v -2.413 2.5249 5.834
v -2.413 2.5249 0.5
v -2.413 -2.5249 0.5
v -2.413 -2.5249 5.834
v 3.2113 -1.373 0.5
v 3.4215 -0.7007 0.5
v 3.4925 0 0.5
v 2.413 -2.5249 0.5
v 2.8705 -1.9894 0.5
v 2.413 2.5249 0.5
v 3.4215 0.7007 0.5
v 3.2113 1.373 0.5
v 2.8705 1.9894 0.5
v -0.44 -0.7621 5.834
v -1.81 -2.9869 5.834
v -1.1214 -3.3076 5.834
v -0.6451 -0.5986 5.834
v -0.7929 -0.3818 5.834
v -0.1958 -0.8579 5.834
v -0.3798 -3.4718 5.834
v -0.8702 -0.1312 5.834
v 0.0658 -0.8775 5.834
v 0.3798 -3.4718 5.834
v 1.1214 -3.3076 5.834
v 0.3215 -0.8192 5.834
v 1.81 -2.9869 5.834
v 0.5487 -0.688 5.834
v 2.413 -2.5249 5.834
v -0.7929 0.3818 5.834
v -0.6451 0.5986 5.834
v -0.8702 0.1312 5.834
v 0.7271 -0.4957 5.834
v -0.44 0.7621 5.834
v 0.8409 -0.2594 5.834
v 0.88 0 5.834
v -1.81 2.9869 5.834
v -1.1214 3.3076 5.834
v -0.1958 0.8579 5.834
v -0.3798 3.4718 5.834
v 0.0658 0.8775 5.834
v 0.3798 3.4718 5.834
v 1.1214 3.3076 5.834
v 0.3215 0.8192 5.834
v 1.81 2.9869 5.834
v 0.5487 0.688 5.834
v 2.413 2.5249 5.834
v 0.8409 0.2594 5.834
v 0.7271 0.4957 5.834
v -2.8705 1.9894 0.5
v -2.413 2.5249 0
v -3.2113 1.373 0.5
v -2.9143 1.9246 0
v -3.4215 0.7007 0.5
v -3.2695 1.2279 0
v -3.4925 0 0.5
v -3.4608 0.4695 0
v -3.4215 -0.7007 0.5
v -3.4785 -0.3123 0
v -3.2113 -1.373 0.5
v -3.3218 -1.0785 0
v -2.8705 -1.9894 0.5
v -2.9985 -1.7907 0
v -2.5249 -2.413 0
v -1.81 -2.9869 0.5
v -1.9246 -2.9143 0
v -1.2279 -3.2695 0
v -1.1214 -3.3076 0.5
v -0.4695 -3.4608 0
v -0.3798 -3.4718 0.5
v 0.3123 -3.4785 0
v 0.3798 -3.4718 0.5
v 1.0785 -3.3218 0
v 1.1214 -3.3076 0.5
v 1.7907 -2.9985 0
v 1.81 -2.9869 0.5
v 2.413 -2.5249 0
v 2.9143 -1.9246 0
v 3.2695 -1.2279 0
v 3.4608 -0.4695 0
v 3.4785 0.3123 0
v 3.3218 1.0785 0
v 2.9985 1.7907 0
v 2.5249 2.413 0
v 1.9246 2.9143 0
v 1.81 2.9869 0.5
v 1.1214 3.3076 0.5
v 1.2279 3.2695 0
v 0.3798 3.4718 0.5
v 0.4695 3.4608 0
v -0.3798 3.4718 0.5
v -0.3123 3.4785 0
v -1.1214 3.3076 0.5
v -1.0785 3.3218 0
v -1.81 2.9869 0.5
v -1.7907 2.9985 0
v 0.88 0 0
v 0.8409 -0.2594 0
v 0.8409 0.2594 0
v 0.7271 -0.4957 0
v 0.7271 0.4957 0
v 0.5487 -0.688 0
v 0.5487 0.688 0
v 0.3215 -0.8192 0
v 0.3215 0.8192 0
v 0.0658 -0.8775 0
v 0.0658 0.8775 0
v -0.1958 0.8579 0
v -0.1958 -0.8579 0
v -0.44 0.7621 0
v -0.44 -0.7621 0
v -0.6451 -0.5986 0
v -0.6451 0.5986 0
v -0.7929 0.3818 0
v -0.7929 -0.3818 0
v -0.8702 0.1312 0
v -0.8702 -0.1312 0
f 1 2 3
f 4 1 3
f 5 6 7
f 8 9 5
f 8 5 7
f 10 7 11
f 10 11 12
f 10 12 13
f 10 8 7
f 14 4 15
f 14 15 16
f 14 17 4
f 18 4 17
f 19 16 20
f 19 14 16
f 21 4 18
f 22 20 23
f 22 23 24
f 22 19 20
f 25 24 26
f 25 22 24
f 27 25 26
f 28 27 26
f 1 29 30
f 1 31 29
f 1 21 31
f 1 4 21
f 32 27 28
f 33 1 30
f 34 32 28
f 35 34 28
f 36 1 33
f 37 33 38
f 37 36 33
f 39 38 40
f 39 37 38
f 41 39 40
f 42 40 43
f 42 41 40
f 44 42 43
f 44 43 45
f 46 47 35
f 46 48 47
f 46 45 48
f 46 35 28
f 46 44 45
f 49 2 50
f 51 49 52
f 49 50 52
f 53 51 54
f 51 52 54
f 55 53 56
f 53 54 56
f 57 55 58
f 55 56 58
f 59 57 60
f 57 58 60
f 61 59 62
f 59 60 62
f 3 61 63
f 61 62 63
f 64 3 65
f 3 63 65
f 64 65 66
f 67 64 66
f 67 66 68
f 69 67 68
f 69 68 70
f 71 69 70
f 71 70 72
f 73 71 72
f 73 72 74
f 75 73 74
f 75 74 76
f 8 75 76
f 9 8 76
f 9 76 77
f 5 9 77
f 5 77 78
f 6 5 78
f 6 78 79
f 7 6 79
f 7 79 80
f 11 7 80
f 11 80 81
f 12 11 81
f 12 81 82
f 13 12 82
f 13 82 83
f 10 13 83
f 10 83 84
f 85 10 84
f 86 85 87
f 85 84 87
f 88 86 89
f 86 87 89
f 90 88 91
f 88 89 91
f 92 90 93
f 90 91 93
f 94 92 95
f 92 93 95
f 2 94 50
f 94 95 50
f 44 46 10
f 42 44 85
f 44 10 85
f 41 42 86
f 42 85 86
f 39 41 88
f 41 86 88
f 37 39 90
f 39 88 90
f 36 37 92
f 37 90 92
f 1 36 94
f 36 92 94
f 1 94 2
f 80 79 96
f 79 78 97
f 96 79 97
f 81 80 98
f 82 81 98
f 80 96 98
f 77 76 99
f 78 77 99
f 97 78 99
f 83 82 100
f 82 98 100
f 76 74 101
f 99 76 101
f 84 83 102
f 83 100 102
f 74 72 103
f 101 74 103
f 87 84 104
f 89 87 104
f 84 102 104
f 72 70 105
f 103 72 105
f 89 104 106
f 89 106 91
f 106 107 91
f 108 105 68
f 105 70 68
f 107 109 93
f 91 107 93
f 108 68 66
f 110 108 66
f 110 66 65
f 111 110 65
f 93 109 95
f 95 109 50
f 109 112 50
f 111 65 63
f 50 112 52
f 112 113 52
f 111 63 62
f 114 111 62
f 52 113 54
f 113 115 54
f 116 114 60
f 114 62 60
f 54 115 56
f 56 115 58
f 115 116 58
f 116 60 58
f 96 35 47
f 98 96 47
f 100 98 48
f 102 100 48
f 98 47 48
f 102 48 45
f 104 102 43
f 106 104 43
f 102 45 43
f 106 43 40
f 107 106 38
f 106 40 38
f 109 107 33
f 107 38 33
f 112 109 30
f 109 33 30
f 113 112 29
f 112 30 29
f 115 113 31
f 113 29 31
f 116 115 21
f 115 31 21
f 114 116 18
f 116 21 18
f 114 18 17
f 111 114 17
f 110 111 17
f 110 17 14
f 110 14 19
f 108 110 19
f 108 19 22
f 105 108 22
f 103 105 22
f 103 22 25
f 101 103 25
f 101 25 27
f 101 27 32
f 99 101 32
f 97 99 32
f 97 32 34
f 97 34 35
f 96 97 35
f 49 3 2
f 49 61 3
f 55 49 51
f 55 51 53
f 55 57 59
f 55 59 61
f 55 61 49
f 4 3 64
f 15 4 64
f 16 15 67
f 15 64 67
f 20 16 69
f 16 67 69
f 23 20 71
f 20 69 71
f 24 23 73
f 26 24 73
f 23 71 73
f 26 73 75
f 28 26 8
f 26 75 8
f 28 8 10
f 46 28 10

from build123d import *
from build123d.topology import SkipClean

# Parameters (mm, degrees)
SKETCH1_R          = 3.4925
EXTRUDE1_DEPTH     = 0.5
EXTRUDE2_DEPTH     = 5.334
CUT_EXTRUDE1_REACH = 9.644
SKETCH3_R          = 0.88


with BuildPart() as part:
    # Sketch1 → Extrude1 (new body)
    with BuildSketch(Plane.XY):
        with Locations(Location((0, 0, 0), (0, 0, 133.702114437))):
            Circle(SKETCH1_R)
    extrude(amount=EXTRUDE1_DEPTH)

    # Sketch2 → Extrude2 (add)
    with SkipClean():  # the faces are left unmerged after this step: merging them gives an invalid solid
        with BuildSketch(Plane.XY.offset(0.5)):
            with BuildLine():
                Line((2.413, -2.52487371), (2.413, 2.52487371))
                ThreePointArc((2.413, 2.52487371), (0, 3.4925), (-2.413, 2.52487371))
                Line((-2.413, 2.52487371), (-2.413, -2.52487371))
                ThreePointArc((-2.413, -2.52487371), (0, -3.4925), (2.413, -2.52487371))
            make_face()
        extrude(amount=EXTRUDE2_DEPTH)

    # Sketch3 → Cut-Extrude1 (cut, up to next)
    with BuildSketch(Plane.XY.offset(5.834), mode=Mode.PRIVATE) as cut_extrude1_sk1:
        Circle(SKETCH3_R)
    cut_extrude1_tool1 = extrude(cut_extrude1_sk1.sketch, amount=-CUT_EXTRUDE1_REACH, mode=Mode.PRIVATE) & part.part
    add(cut_extrude1_tool1.solids().sort_by_distance((0, 0, 5.834))[0], mode=Mode.SUBTRACT)


solid = part.part
